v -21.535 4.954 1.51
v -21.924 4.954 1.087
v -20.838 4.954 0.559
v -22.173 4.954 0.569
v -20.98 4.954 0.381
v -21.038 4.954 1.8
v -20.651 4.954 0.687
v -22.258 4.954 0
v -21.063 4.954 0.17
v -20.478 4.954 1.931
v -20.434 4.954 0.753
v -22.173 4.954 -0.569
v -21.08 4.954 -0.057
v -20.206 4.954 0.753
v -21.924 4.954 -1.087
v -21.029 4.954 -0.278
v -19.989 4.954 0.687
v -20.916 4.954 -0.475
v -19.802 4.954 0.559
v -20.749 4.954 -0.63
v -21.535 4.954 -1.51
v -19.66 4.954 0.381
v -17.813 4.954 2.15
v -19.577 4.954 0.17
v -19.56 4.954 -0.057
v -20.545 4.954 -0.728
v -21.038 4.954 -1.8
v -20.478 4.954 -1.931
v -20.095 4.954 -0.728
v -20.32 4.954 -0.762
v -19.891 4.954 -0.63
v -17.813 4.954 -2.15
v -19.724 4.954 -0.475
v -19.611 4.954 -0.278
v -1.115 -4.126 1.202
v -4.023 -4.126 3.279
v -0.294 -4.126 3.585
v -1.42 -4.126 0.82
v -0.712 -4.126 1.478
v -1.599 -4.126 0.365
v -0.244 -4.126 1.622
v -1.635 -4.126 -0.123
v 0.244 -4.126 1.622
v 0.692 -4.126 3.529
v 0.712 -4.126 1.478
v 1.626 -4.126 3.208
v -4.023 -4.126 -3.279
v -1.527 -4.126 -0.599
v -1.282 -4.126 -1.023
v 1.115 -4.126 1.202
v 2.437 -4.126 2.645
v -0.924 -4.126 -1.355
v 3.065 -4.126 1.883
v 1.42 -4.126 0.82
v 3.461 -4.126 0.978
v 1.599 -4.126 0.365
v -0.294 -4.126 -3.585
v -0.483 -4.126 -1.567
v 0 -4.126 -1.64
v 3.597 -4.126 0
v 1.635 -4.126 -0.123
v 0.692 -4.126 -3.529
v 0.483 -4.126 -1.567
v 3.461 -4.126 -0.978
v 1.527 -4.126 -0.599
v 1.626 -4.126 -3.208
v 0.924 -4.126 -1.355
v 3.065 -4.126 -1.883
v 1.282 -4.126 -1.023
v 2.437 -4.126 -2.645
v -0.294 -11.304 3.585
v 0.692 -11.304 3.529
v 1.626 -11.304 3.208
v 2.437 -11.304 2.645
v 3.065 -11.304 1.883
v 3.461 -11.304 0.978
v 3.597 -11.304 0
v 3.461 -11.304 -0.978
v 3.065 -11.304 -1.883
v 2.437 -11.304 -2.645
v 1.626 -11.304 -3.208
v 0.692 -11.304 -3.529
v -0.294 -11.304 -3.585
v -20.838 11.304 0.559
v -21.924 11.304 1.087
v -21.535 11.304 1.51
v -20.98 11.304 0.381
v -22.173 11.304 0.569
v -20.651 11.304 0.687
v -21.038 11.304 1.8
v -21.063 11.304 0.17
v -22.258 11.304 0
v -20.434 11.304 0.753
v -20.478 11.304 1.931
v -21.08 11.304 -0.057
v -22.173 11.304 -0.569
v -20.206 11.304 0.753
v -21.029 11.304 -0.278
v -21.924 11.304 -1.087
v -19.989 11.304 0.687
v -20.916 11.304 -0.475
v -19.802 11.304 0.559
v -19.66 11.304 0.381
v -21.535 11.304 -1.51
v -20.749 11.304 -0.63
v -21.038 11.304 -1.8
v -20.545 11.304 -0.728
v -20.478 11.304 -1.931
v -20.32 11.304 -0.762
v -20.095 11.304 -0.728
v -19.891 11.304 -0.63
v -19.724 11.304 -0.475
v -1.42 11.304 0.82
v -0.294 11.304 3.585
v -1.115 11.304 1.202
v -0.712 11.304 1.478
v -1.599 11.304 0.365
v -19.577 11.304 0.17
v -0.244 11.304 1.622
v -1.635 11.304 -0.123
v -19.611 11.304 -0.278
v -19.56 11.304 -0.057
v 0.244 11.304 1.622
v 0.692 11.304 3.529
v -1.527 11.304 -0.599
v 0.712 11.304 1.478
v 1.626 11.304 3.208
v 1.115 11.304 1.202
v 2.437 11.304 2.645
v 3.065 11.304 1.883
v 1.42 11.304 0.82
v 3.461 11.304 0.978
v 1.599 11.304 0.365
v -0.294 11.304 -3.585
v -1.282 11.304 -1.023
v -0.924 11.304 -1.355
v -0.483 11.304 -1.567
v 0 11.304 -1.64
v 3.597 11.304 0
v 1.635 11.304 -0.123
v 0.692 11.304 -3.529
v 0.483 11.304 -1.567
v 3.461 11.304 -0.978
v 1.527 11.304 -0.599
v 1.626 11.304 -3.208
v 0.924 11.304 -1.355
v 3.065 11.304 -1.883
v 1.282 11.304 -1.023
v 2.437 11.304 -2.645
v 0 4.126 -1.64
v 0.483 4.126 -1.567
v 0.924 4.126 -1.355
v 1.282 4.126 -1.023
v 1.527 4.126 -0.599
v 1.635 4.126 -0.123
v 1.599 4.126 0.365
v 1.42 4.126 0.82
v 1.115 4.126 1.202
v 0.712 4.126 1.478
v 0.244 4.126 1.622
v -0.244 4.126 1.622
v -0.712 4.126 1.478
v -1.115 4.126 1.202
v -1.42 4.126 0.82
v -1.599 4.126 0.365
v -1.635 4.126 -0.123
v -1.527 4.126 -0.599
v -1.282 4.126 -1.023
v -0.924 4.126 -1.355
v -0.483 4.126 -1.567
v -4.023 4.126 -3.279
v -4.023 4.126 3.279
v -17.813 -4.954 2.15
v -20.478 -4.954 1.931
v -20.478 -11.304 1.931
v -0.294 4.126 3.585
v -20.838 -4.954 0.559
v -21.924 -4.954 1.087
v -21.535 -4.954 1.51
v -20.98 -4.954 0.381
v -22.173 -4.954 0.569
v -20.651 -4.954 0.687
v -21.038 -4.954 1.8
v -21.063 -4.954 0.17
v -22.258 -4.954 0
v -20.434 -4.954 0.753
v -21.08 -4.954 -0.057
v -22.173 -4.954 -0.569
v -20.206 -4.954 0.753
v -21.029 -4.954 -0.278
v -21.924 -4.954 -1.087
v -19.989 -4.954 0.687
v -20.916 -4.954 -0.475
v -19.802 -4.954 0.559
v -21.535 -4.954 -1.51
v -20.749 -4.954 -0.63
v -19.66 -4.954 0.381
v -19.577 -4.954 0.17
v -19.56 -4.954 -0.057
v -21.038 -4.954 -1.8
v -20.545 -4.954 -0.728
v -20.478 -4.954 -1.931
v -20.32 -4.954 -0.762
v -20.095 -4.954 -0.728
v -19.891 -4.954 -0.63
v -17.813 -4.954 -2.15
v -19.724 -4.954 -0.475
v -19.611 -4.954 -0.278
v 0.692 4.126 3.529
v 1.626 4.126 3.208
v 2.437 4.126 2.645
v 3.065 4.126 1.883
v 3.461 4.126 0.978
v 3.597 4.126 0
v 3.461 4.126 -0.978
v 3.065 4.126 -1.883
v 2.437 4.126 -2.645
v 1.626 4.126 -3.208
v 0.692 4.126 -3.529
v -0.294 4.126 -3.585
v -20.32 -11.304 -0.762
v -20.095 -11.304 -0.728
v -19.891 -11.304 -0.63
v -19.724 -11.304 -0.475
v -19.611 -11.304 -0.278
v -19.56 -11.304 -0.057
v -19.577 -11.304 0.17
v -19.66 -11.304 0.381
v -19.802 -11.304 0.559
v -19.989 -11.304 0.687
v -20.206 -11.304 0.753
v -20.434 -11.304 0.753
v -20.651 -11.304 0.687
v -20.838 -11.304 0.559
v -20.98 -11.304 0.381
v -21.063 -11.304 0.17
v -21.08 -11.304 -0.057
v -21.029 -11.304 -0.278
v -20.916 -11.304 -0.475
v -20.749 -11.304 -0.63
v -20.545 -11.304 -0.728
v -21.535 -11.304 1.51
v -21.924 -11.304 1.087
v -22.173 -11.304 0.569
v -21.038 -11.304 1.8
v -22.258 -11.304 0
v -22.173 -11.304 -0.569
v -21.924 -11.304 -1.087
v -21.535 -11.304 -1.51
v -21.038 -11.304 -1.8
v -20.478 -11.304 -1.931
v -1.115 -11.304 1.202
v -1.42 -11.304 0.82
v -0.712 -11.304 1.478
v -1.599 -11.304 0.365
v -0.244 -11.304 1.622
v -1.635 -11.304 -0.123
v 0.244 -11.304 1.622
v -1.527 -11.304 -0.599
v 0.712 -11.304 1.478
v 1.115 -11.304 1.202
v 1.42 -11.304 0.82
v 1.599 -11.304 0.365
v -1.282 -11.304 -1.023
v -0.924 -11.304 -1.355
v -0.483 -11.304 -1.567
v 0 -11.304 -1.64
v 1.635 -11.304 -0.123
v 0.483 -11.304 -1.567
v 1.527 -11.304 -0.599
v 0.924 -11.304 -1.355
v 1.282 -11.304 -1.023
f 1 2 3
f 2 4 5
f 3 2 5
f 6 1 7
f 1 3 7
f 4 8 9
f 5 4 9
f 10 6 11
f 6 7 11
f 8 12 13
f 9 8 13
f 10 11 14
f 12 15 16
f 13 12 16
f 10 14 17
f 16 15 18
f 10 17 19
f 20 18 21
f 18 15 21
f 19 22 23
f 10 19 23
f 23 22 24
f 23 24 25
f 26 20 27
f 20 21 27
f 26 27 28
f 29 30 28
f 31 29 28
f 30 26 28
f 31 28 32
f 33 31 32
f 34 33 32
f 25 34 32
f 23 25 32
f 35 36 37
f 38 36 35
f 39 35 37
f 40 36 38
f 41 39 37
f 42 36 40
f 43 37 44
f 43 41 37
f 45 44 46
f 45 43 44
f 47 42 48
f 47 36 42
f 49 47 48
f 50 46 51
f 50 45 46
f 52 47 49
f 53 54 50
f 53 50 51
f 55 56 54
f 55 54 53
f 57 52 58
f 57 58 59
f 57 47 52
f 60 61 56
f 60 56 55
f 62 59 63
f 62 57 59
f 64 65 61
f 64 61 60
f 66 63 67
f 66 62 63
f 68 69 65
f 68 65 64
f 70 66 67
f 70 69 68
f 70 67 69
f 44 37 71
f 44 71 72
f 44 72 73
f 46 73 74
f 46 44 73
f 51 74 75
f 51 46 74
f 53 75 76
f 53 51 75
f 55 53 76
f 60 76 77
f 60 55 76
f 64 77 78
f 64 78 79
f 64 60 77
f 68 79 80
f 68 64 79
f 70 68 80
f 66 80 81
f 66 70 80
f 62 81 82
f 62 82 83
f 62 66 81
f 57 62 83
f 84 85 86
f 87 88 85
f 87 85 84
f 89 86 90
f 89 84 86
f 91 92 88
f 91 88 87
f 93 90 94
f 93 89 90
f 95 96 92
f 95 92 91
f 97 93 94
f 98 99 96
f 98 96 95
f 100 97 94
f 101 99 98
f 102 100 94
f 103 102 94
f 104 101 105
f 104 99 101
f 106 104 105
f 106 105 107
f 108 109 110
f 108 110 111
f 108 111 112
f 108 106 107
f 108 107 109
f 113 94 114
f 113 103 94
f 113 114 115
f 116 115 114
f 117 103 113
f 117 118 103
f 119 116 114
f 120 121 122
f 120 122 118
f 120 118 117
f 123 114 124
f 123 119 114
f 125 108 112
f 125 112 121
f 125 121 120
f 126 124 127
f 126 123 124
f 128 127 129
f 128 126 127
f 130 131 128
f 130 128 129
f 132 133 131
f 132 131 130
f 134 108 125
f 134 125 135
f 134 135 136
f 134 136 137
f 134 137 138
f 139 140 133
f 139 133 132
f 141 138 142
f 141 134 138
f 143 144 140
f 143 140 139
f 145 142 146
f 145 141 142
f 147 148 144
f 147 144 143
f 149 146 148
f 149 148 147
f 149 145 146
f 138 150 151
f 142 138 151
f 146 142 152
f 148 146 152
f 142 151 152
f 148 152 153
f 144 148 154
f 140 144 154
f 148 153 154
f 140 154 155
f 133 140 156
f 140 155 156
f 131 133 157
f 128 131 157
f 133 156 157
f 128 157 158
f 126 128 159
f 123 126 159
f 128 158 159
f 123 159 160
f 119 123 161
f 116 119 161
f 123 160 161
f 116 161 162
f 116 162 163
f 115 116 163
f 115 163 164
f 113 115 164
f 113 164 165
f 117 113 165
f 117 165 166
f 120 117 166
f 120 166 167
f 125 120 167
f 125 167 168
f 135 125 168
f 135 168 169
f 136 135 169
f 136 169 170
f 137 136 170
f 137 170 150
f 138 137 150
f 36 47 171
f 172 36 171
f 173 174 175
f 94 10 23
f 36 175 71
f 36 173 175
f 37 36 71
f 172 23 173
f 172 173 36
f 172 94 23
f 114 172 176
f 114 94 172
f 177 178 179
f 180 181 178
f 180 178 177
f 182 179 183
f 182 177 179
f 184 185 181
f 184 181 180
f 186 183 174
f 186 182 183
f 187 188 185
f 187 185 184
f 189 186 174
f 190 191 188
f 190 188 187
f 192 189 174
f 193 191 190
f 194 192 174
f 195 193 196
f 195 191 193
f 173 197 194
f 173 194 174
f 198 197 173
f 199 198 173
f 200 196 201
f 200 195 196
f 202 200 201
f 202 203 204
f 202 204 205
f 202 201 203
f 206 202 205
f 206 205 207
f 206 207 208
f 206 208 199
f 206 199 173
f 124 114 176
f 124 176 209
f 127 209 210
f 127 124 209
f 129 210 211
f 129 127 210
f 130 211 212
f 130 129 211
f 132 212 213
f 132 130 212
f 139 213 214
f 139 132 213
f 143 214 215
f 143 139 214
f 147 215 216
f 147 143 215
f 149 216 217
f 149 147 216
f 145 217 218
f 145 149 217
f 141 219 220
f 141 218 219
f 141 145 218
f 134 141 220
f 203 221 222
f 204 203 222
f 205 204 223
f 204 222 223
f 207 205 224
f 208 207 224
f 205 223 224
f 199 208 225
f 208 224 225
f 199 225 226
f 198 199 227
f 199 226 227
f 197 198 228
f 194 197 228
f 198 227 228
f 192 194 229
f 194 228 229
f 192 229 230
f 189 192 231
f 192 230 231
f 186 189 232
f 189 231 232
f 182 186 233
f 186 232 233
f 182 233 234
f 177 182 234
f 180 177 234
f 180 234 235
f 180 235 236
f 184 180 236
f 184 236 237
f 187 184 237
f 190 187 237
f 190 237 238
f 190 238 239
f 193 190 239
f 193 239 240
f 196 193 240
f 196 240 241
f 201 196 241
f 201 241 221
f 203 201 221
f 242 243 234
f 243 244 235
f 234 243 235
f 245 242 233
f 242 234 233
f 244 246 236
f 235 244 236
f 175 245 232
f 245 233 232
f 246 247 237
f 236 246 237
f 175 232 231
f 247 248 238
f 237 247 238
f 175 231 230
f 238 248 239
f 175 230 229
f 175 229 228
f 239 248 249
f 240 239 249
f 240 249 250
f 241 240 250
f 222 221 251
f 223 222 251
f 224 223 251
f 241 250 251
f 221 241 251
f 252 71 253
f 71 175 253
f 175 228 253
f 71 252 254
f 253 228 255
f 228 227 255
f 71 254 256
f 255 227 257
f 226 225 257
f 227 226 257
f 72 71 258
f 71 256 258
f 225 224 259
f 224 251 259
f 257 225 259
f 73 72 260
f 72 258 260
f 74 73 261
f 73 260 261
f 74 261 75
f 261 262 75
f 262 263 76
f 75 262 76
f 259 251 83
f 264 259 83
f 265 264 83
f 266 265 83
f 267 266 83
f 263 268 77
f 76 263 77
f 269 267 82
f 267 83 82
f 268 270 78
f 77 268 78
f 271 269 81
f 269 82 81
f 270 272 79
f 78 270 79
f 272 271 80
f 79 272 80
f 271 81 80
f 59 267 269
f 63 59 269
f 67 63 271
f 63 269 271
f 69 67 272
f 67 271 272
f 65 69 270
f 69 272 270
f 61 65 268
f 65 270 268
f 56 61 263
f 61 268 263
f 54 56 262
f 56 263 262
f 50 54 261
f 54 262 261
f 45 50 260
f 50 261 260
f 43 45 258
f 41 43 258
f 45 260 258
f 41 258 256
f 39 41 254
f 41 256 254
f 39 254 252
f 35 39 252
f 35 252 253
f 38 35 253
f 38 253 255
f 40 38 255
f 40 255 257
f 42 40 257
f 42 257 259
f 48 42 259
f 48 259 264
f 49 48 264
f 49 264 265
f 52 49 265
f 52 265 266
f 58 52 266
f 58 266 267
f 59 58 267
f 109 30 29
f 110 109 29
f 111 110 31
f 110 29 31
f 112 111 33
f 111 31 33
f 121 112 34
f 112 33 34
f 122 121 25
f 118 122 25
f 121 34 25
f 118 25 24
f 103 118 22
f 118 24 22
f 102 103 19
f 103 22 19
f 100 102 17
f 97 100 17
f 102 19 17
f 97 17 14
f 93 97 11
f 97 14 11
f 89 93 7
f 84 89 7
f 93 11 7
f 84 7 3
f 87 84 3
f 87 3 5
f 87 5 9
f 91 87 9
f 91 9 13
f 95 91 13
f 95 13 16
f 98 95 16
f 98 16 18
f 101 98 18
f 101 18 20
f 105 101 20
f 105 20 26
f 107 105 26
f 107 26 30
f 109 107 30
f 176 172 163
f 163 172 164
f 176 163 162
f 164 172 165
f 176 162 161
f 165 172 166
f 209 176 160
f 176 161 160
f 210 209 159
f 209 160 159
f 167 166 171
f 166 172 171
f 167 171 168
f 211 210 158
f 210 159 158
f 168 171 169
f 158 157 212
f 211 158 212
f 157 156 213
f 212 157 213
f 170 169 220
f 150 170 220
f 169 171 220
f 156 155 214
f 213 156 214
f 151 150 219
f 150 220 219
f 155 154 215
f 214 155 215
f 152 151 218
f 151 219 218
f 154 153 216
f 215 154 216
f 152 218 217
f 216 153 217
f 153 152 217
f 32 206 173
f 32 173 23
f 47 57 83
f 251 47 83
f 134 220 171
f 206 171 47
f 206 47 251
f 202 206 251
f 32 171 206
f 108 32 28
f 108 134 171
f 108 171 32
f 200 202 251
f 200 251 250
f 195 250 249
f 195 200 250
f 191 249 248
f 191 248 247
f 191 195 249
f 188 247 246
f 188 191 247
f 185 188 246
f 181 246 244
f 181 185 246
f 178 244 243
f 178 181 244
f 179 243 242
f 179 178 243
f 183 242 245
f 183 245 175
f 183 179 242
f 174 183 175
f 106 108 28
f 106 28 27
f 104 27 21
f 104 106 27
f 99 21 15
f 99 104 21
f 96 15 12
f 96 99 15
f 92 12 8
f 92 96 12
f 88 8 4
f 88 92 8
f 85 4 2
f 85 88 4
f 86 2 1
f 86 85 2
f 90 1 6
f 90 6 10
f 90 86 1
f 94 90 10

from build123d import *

# Parameters (mm, degrees)
EXTRUDE2_DEPTH          = 11.304095629
CUT_EXTRUDE5_DEPTH      = 26.221647195
CUT_EXTRUDE5_DEPTH_BACK = 26.221647195
SKETCH4_W               = 7.62
SKETCH4_H               = 8.252337146
SKETCH5_R               = 1.64
CUT_EXTRUDE6_DEPTH      = 32.929284696
EXTRUDE4_DEPTH          = 26.221647195
EXTRUDE4_DEPTH_BACK     = 26.221647195
SKETCH6_W               = 4.445
SKETCH6_H               = 9.908191258
SKETCH7_R               = 0.762
EXTRUDE5_DEPTH          = 32.929284696


with BuildPart() as part:
    # Sketch2 → Extrude2 (new, symmetric)
    with BuildSketch(Plane(origin=(0.008589011, 0, 0), x_dir=(1, 0, 0), z_dir=(0, 1, 0))):
        with BuildLine():
            Line((-0.302201676, 3.58467598), (-20.486785806, 1.931402555))
            ThreePointArc((-20.486785806, 1.931402555), (-22.266459506, 0), (-20.486785806, -1.931402555))
            Line((-20.486785806, -1.931402555), (-0.302201676, -3.58467598))
            ThreePointArc((-0.302201676, -3.58467598), (3.588091442, 0), (-0.302201676, 3.58467598))
        make_face()
    extrude(amount=EXTRUDE2_DEPTH, both=True)

    # Sketch4 → Cut-Extrude5 (cut, two sides: drawn at the far end of the back side and taken through both)
    with BuildSketch(Plane.XY.offset(-CUT_EXTRUDE5_DEPTH_BACK)):
        with Locations((-0.213319547, 0)):
            Rectangle(SKETCH4_W, SKETCH4_H)
    extrude(amount=CUT_EXTRUDE5_DEPTH + CUT_EXTRUDE5_DEPTH_BACK, mode=Mode.SUBTRACT)

    # Sketch5 → Cut-Extrude6 (cut, through all)
    with BuildSketch(Plane.XZ.offset(11.304095629)):
        with Locations(Location((0, 0, 0), (0, 0, 270))):
            Circle(SKETCH5_R)
    extrude(amount=-CUT_EXTRUDE6_DEPTH, mode=Mode.SUBTRACT)

    # Sketch6 → Extrude4 (cut, two sides: drawn at the far end of the back side and taken through both)
    with BuildSketch(Plane.XY.offset(-EXTRUDE4_DEPTH_BACK)):
        with Locations((-20.035370495, 0)):
            Rectangle(SKETCH6_W, SKETCH6_H)
    extrude(amount=EXTRUDE4_DEPTH + EXTRUDE4_DEPTH_BACK, mode=Mode.SUBTRACT)

    # Sketch7 → Extrude5 (cut, through all)
    with BuildSketch(Plane.XZ.offset(11.304095629)):
        with Locations(Location((-20.32, 0, 0), (0, 0, 270))):
            Circle(SKETCH7_R)
    extrude(amount=-EXTRUDE5_DEPTH, mode=Mode.SUBTRACT)


solid = part.part
